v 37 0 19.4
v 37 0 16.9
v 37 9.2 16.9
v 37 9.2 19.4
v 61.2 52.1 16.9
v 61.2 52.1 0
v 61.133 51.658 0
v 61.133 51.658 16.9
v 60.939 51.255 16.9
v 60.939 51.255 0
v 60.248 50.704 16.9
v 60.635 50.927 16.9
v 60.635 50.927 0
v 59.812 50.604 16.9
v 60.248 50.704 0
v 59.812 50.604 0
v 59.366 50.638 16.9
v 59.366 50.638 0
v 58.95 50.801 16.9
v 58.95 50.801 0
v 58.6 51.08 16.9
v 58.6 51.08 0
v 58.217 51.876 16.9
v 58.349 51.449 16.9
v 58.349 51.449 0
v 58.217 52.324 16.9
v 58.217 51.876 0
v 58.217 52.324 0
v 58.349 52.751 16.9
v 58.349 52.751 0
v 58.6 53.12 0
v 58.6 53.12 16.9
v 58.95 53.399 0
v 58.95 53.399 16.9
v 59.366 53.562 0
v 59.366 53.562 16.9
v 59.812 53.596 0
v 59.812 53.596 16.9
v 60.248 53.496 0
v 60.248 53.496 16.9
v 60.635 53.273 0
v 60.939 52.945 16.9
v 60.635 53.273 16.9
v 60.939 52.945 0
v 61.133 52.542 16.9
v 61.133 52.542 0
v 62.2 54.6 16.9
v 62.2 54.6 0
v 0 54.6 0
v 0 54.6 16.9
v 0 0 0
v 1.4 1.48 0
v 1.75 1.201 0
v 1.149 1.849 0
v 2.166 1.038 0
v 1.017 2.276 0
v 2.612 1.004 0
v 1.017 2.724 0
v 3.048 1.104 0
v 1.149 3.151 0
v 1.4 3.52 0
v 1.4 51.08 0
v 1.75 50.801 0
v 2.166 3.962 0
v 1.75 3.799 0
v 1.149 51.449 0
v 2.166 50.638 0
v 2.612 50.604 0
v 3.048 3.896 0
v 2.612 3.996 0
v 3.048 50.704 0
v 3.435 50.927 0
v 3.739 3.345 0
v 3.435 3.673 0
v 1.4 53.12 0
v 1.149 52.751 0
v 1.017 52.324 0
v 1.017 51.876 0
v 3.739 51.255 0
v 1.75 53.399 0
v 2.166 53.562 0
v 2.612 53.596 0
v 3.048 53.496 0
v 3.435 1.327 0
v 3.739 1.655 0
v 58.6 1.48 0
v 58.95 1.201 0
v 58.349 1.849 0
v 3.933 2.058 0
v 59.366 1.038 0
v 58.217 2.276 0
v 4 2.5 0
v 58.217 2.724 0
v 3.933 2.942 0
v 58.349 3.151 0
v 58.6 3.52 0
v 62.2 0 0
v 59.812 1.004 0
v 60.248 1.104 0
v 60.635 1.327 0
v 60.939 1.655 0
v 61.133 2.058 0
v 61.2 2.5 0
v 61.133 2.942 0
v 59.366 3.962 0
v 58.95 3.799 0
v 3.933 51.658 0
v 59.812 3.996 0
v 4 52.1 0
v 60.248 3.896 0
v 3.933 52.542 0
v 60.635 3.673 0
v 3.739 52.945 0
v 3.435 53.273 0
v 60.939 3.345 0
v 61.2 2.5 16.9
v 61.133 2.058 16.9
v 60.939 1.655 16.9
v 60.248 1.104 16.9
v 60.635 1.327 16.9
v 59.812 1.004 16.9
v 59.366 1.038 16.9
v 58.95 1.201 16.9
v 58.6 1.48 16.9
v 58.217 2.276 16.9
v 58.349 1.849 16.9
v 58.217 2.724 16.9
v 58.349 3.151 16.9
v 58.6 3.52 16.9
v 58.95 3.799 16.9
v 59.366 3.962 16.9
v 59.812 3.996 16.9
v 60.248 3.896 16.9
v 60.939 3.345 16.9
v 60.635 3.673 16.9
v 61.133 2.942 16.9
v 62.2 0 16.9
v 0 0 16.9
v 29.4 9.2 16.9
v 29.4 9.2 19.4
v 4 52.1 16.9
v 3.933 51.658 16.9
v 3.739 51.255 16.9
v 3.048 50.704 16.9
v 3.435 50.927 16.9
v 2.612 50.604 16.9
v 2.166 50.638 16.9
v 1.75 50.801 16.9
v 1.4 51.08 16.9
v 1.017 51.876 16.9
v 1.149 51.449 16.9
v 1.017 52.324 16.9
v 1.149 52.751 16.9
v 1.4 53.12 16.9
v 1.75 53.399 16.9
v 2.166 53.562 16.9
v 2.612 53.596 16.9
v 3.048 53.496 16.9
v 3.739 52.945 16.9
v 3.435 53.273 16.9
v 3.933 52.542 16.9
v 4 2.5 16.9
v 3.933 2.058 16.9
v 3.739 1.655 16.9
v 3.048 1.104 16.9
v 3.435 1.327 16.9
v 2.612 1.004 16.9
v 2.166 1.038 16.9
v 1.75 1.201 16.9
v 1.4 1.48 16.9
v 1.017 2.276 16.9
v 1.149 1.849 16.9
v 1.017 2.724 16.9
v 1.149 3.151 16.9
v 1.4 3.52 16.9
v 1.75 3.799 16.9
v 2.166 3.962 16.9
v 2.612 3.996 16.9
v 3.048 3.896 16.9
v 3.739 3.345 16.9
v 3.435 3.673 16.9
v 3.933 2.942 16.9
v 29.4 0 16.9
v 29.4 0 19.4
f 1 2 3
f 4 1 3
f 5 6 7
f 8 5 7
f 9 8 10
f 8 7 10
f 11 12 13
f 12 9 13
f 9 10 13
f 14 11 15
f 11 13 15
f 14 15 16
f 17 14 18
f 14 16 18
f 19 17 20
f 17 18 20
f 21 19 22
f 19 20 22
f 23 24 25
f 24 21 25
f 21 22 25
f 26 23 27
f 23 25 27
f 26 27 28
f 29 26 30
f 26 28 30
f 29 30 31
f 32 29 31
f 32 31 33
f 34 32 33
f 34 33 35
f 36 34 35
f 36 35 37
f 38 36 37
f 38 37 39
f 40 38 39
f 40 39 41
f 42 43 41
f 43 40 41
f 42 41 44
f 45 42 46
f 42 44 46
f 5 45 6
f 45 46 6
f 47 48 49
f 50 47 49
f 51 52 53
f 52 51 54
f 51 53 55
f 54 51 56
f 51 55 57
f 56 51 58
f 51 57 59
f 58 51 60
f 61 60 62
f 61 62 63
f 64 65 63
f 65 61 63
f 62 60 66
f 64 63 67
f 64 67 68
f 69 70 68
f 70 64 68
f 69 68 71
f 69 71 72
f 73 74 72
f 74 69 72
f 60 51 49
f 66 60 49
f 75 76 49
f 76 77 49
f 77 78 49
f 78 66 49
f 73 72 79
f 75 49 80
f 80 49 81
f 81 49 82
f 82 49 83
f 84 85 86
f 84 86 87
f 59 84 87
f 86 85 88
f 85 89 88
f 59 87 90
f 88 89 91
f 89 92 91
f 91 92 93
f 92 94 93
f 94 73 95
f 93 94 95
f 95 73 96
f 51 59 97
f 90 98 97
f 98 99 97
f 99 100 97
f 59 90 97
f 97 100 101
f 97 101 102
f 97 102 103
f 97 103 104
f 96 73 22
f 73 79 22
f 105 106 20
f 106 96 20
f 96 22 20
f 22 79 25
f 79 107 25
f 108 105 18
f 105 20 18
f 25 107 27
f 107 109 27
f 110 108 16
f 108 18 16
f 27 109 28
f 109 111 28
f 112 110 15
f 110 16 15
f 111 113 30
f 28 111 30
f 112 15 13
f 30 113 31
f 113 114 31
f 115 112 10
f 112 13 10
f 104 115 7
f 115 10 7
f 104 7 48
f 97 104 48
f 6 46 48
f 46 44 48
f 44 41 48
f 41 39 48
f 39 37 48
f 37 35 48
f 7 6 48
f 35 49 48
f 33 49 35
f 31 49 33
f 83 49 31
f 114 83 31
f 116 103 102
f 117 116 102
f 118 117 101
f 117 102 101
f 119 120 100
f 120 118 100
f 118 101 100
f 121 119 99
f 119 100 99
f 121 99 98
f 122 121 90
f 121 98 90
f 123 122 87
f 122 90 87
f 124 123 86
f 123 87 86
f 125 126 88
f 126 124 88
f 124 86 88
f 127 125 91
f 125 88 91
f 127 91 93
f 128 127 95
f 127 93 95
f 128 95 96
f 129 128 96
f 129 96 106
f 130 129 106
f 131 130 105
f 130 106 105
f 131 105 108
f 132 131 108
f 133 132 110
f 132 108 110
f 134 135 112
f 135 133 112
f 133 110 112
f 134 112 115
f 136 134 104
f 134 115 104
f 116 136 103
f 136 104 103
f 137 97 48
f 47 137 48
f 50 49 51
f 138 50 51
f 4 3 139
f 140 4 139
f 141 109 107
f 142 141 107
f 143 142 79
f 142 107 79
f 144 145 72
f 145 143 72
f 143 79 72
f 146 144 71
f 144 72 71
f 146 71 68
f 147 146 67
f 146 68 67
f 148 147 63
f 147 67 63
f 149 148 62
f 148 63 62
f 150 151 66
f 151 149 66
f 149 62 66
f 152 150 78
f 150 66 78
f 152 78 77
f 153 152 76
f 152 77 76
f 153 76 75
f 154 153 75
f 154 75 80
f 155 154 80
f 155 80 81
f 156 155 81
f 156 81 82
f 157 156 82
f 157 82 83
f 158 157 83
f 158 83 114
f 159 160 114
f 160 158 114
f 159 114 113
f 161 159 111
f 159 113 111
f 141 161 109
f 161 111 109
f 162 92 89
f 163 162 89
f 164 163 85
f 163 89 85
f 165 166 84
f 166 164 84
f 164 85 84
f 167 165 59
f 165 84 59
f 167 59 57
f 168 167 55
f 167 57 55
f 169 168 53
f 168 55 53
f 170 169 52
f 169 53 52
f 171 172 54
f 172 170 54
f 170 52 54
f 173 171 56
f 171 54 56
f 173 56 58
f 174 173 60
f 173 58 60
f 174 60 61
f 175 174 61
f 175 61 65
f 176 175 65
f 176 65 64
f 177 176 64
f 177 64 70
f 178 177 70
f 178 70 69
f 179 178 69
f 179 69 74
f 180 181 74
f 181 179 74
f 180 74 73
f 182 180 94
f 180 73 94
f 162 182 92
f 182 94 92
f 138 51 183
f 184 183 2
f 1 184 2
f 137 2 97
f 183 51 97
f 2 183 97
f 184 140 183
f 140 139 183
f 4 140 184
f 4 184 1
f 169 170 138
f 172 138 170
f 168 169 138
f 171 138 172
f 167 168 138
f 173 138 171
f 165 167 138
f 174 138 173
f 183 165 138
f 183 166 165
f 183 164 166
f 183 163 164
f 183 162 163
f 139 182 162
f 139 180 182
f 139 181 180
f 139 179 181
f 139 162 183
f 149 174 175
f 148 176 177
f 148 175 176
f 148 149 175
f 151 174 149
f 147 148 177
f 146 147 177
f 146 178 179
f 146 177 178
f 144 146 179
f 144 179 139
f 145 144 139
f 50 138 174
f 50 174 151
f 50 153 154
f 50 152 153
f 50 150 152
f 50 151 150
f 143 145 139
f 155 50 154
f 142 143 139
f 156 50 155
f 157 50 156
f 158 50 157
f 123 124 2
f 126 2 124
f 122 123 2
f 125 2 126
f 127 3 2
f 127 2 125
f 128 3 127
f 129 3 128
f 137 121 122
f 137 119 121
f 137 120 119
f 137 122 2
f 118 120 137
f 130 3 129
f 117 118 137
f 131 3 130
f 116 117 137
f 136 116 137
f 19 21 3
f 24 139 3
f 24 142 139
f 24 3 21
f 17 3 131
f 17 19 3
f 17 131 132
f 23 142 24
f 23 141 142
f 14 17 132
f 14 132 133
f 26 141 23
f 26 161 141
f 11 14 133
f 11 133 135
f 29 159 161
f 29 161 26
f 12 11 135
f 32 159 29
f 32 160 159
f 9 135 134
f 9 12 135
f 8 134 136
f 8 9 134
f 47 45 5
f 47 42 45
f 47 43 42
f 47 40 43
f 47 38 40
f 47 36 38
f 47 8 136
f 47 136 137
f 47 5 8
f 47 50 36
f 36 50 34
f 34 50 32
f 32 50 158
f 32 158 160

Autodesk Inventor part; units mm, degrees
ref_plane "YZ Plane" through (0, 0, 0) normal (1, 0, 0) x (0, 1, 0)
ref_plane "XZ Plane" through (0, 0, 0) normal (0, 1, 0) x (-1, 0, 0)
ref_plane "XY Plane" through (0, 0, 0) normal (0, 0, 1) x (1, 0, 0)
sketch "Sketch1" plane through (0, 0, 0) normal (0, 0, 1) x (1, 0, 0)
  line L0 (0, 0) -> (62.2, 0)
  line L1 (62.2, 0) -> (62.2, 54.6)
  line L2 (62.2, 54.6) -> (0, 54.6)
  line L3 (0, 54.6) -> (0, 0)
  line L4 (1, 54.6) -> (1, 0) construction
  line L5 (0, 1) -> (62.2, 1) construction
  line L6 (61.2, 0) -> (61.2, 54.6) construction
  line L7 (0, 53.6) -> (62.2, 53.6) construction
  circle A0 centre (2.5, 52.1) radius 1.5
  circle A1 centre (59.7, 52.1) radius 1.5
  circle A2 centre (2.5, 2.5) radius 1.5
  circle A3 centre (59.7, 2.5) radius 1.5
  point P0 (33.2, 0)
  dimension "d0" = 62.2
  dimension "d1" = 54.6
  dimension "d2" = 29
  dimension "d3" = 1
  dimension "d4" = 1
  dimension "d5" = 1
  dimension "d6" = 1
  dimension "d7" = 3
extrude "Extrusion1" add sketch "Sketch1" along normal blind 16.9
ref_plane "Work Plane1" through (0, 0, 16.9) normal (0, 0, 1) x (1, 0, 0)
sketch "Sketch2" plane through (0, 0, 16.9) normal (0, 0, 1) x (1, 0, 0)
  line L0 (0, 0) -> (62.2, 0) projected
  line L1 (29.4, 0) -> (37, 0)
  line L2 (37, 0) -> (37, 9.2)
  line L3 (37, 9.2) -> (29.4, 9.2)
  line L4 (29.4, 9.2) -> (29.4, 0)
  point P0 (33.2, 0)
  dimension "d11" = 29
  dimension "d12" = 7.6
  dimension "d13" = 9.2
extrude "Extrusion2" add sketch "Sketch2" along normal blind 2.5
equation "\"d4\" = d3"
equation "\"d5\" = d3"
equation "\"d6\" = d3"
properties part number "board_rev0"
